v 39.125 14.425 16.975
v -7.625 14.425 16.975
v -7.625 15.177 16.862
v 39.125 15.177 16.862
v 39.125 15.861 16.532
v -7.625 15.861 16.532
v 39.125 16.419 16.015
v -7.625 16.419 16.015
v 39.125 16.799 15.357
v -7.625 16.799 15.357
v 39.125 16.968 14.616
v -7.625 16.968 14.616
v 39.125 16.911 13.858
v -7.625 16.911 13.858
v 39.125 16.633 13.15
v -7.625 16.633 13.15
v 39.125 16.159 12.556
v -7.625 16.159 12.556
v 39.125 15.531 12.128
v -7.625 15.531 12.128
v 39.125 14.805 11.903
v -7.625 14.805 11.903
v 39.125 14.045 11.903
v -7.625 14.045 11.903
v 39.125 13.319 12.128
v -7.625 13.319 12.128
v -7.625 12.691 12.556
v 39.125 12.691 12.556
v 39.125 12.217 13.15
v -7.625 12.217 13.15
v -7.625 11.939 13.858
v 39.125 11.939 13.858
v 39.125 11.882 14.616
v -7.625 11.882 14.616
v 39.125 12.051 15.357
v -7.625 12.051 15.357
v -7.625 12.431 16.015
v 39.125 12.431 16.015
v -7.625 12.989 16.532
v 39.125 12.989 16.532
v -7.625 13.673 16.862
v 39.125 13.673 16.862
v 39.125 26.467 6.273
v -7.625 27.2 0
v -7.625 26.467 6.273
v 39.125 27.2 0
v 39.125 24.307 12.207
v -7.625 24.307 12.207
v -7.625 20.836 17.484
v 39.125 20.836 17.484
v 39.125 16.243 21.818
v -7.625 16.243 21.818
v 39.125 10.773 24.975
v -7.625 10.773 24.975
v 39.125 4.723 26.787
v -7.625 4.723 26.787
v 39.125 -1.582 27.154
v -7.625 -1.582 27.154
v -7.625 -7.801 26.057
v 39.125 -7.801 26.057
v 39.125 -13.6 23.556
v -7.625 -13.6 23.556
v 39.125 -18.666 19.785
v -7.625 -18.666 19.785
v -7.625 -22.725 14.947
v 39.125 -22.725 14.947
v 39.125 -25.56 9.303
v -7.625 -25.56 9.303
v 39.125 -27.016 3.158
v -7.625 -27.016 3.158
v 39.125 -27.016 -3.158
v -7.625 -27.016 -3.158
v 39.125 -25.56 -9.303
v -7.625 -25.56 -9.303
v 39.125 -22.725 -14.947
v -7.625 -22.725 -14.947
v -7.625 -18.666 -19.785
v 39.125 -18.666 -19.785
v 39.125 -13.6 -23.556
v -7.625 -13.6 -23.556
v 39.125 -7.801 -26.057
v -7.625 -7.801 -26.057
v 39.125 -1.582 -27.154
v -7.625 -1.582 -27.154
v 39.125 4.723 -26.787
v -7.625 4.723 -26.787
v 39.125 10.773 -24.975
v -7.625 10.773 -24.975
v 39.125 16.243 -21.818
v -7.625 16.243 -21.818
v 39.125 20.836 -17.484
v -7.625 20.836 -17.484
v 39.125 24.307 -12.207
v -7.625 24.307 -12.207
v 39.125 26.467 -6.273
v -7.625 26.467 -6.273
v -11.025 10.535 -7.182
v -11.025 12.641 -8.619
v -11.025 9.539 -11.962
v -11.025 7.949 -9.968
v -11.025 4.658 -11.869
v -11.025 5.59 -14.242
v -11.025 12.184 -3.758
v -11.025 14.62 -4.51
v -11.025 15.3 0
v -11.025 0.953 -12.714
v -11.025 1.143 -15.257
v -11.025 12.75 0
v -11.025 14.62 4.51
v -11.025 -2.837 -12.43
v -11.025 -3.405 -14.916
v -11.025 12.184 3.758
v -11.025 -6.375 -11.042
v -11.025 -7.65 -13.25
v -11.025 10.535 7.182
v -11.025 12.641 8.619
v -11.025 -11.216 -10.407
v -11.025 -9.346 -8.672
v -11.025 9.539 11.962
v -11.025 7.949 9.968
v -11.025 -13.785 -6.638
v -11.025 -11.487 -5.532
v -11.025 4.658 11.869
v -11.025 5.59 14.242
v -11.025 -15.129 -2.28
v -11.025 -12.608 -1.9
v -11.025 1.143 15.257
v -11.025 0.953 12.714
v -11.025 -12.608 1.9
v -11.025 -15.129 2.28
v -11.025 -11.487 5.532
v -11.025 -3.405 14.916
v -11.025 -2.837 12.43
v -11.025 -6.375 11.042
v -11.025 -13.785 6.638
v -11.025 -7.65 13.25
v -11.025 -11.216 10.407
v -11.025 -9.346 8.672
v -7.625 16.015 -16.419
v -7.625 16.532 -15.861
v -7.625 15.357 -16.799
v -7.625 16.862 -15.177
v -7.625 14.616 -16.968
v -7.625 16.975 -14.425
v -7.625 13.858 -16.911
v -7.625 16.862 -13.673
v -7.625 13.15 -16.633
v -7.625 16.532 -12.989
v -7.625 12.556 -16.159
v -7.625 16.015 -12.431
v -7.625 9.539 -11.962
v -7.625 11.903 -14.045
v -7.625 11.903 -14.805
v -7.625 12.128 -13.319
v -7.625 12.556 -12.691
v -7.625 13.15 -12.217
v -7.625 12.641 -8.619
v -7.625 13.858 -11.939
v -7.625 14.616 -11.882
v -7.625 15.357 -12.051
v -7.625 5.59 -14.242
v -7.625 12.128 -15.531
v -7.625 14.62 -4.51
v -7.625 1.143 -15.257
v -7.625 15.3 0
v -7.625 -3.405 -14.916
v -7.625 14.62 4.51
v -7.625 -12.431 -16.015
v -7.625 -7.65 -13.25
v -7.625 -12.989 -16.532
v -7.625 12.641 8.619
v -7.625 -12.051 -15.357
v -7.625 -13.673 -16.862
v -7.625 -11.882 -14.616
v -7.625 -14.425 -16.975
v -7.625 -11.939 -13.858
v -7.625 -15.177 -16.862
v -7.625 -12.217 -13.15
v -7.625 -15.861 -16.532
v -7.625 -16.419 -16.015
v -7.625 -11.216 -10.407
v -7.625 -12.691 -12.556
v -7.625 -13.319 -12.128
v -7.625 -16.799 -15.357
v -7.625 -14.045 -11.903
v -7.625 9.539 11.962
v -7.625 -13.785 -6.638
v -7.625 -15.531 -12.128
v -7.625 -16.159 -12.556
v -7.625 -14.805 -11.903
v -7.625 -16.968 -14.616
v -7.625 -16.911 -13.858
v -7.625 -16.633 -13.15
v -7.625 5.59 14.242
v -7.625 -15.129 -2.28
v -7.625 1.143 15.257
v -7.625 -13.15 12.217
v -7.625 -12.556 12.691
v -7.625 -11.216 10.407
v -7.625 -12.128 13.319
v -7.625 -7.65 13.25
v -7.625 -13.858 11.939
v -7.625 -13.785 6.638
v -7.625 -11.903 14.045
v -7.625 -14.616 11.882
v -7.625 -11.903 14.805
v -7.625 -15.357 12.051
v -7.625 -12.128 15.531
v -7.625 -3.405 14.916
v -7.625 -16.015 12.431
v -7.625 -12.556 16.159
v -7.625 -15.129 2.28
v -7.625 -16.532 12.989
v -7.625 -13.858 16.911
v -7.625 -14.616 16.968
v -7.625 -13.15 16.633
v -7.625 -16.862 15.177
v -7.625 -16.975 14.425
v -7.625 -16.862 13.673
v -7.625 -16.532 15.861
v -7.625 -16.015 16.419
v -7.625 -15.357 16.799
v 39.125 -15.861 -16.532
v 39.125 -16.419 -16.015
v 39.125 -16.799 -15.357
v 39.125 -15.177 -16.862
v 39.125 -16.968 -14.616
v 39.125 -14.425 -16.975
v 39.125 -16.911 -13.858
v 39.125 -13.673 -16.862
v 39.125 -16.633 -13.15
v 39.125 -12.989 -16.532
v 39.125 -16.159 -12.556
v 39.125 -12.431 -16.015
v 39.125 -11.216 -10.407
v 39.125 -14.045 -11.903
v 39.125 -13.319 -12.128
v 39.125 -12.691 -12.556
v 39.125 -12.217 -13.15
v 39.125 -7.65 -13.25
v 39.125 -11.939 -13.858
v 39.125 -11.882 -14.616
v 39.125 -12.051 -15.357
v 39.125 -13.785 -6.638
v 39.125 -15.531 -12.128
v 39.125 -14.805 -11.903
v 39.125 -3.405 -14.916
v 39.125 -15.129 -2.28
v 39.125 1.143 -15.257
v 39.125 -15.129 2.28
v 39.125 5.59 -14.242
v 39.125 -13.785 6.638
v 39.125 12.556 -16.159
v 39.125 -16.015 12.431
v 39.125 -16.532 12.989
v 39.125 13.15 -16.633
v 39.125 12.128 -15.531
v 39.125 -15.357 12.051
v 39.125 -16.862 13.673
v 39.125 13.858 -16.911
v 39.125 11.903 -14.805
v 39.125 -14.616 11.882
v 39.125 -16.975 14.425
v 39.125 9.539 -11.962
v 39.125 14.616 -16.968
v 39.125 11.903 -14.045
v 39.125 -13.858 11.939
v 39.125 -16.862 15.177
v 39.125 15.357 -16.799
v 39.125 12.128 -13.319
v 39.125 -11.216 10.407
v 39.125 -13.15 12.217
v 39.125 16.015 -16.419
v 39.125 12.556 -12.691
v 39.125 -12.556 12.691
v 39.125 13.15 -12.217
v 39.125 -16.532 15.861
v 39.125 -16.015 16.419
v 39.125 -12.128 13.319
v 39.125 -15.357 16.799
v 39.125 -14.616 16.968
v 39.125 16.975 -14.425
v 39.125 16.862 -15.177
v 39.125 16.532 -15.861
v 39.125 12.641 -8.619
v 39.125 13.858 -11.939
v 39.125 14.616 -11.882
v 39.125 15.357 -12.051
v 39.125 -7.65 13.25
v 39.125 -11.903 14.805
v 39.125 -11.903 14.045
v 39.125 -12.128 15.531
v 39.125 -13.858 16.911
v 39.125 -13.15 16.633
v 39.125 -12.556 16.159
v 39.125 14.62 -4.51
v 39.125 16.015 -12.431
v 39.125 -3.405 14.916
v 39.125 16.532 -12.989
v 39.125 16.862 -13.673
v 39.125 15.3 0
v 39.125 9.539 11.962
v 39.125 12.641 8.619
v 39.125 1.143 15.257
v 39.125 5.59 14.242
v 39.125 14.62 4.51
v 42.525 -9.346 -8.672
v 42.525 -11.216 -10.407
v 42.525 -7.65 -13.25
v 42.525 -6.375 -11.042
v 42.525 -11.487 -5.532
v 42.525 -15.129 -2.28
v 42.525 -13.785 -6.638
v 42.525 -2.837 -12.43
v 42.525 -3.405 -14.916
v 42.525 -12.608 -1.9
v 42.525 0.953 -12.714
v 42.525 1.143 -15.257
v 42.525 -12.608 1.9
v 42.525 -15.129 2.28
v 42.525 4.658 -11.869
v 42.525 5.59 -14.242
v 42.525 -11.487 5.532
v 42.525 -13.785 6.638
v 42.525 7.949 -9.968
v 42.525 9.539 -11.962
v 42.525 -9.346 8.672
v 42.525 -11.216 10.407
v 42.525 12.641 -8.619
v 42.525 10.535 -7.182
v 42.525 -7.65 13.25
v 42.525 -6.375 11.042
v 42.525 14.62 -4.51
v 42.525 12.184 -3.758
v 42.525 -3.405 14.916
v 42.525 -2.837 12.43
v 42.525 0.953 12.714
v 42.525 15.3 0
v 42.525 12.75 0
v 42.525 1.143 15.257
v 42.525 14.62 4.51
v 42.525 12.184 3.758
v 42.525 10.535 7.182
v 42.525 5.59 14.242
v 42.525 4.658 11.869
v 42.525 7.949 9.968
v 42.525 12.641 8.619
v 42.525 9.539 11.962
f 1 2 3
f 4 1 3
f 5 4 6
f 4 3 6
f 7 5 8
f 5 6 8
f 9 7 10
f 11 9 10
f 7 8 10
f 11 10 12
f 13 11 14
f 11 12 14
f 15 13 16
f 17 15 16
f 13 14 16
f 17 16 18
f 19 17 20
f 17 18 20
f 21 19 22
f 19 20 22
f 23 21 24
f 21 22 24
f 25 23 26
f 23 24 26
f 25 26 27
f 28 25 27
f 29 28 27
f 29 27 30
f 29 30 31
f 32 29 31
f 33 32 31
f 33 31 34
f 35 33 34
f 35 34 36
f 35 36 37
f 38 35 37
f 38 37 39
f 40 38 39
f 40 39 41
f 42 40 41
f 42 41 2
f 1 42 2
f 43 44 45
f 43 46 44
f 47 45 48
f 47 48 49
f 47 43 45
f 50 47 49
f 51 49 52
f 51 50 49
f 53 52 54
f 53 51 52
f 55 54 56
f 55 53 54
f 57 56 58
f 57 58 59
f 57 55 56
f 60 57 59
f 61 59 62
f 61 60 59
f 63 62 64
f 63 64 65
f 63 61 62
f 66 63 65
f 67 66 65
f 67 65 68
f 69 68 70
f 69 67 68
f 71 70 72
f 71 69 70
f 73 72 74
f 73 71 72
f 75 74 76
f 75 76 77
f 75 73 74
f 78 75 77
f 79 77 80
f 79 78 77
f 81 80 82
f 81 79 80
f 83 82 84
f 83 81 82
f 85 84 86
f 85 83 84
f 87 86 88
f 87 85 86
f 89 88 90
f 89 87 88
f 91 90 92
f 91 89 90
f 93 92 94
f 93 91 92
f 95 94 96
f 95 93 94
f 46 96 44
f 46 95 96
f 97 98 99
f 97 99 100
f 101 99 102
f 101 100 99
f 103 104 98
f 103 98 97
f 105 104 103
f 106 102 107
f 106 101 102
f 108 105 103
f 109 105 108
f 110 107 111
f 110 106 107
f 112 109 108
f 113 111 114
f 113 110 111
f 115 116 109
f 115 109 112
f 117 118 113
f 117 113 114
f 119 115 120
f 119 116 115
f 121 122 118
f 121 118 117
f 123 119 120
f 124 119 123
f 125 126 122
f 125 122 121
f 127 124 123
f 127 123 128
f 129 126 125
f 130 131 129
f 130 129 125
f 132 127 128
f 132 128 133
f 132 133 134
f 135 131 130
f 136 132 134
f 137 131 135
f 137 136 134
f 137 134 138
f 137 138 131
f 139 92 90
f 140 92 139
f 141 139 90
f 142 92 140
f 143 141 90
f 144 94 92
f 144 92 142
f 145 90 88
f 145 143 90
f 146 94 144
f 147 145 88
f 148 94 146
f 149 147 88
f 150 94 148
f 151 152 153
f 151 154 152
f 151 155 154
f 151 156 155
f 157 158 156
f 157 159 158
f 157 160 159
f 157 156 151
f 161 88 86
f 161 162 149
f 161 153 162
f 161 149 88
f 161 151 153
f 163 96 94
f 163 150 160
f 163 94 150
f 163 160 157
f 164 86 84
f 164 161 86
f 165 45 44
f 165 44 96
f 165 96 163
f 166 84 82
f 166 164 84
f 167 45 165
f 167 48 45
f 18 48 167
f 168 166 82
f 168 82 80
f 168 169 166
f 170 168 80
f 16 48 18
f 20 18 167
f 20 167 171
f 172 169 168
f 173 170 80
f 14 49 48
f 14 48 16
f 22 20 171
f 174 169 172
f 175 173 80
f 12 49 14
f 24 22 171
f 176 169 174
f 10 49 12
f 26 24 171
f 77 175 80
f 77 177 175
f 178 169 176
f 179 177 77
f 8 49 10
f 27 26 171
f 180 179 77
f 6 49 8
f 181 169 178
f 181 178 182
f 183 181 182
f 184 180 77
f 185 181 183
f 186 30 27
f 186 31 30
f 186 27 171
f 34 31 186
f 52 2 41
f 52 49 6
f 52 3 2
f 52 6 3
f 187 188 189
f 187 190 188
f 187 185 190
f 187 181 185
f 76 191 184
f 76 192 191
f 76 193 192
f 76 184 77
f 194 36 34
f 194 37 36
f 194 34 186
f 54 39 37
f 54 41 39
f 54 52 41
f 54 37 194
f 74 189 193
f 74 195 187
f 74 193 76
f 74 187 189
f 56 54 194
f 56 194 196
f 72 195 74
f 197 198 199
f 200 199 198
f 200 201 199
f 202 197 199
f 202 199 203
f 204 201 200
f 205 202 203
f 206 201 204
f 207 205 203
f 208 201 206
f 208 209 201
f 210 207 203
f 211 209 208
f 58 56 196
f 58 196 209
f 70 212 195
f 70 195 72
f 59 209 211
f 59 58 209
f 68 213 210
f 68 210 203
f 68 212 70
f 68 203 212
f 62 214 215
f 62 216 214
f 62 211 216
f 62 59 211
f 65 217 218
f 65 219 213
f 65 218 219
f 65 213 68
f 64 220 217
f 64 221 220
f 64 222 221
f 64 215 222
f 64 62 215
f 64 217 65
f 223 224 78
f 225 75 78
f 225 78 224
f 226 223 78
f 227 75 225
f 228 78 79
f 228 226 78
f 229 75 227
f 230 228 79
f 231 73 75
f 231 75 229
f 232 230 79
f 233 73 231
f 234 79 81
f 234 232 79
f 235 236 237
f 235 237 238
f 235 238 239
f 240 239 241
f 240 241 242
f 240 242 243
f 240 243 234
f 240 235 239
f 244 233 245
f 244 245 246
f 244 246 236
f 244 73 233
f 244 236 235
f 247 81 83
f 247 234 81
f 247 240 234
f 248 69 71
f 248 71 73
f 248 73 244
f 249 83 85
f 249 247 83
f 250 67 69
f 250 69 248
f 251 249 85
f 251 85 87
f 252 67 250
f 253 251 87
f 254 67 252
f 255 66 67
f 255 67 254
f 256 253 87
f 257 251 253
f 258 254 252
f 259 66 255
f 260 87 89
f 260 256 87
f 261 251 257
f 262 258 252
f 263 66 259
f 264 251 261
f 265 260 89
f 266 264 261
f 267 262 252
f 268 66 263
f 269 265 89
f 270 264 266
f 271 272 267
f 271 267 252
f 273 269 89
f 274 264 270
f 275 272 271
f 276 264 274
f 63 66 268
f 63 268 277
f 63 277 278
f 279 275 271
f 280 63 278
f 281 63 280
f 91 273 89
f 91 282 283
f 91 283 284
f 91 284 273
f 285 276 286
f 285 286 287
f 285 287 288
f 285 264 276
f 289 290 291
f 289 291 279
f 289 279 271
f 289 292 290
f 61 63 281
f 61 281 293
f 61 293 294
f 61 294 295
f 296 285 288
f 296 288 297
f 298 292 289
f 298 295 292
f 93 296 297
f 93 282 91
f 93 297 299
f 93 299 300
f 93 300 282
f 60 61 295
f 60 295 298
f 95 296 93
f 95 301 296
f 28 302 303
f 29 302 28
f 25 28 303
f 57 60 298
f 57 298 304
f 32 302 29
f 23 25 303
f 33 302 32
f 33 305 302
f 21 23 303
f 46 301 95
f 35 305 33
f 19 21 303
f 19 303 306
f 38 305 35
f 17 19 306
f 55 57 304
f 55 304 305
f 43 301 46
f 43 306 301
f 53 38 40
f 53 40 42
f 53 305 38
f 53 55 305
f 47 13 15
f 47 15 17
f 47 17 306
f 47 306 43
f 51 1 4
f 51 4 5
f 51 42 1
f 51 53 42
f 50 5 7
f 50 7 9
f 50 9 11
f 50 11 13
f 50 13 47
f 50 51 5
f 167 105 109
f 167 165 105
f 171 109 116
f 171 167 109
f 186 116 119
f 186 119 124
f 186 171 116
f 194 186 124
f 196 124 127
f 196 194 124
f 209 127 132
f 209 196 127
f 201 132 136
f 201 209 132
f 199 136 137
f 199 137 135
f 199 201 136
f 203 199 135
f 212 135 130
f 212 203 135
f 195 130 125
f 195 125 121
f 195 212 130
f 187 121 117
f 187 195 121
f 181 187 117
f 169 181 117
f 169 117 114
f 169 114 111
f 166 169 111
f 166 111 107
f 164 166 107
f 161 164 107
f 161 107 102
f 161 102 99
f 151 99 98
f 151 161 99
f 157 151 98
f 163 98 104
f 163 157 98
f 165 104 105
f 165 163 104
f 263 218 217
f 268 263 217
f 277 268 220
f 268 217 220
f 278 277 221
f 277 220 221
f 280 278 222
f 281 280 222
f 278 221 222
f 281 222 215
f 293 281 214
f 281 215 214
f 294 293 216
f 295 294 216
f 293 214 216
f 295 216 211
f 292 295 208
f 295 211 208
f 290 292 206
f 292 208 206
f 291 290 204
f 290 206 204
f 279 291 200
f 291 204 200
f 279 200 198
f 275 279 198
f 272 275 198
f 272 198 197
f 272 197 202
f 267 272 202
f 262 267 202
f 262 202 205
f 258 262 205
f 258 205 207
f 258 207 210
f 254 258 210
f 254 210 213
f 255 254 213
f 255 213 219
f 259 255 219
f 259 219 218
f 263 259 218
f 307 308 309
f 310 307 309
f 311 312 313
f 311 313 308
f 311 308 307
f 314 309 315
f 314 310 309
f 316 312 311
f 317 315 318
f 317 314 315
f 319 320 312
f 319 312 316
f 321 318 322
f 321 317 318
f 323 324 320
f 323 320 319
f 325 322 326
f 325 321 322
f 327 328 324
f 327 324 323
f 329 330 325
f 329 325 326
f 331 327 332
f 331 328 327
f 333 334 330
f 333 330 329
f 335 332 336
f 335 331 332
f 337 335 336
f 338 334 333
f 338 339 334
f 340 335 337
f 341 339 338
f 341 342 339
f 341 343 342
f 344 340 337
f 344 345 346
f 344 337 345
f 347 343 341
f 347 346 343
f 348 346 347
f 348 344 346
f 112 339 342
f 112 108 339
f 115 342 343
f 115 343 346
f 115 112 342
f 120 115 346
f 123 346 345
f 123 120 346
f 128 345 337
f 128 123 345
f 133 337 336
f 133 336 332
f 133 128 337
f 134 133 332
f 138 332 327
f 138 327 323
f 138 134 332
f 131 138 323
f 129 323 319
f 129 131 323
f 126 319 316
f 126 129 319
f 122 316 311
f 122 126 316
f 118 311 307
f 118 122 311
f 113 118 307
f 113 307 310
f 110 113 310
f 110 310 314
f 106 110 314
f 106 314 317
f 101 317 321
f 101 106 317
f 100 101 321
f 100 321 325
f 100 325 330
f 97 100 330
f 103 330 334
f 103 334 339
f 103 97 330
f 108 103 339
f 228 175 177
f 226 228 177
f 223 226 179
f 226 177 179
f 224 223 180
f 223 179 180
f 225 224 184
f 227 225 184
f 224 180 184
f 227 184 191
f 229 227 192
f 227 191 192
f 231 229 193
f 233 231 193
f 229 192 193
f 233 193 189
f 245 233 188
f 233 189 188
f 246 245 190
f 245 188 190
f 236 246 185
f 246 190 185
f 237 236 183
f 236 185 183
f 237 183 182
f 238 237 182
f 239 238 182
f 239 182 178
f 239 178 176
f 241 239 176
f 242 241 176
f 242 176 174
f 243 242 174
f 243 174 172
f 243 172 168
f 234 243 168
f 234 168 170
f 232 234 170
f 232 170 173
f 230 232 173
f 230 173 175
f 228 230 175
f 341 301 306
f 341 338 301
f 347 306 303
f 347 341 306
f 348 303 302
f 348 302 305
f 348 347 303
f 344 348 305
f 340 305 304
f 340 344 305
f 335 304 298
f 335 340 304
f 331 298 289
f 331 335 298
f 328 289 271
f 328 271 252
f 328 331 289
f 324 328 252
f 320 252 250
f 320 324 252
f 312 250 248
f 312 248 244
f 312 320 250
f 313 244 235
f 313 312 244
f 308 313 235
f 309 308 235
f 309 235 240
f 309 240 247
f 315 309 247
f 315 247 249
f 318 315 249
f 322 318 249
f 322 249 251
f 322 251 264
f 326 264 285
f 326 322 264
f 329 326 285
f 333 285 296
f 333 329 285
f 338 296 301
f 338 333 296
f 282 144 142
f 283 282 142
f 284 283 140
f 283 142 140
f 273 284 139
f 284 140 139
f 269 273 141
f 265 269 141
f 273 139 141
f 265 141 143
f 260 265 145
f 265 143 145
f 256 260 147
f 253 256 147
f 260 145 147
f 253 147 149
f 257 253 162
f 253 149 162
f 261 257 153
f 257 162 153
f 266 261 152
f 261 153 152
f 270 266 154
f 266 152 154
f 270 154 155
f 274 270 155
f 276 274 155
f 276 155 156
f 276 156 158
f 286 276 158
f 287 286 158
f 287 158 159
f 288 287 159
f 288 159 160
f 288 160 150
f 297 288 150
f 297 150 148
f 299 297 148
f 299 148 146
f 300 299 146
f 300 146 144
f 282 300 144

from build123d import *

# Parameters (mm, degrees)
SKETCH2_R          = 1.5
CUT_EXTRUDE1_DEPTH = 30.5
CIRPATTERN1_COUNT  = 4
SCALE1_SCALE       = 1.7


with BuildPart() as part:
    # Sketch1 → Revolve1 (revolve)
    with BuildSketch(Plane.XY):
        Polygon((0, 7.5), (0, 9), (2, 9), (2, 16), (29.5, 16), (29.5, 9), (31.5, 9), (31.5, 7.5), align=None)
    revolve(axis=Axis((0, 0, 0), (1, 0, 0)))

    # Sketch2 → Cut-Extrude1 (cut, through all)
    with BuildSketch(Plane.ZY.offset(-2)):
        with Locations((8.485281374, 8.485281374)):
            Circle(SKETCH2_R)
    cut_extrude1 = extrude(amount=-CUT_EXTRUDE1_DEPTH, mode=Mode.SUBTRACT)

    # CirPattern1: Cut-Extrude1 ×4 about axis
    cirpattern1_axis = Axis((0, 0, 0), (1, 0, 0))
    for i in range(1, CIRPATTERN1_COUNT):
        add(cut_extrude1.rotate(cirpattern1_axis, i * 360 / CIRPATTERN1_COUNT), mode=Mode.SUBTRACT)


with BuildPart() as part_1:
    # Scale1: scaled about (15.75, 0, 0)
    add(part.part.scale(SCALE1_SCALE).moved(Location((-11.025, 0, 0))))


solid = part_1.part
